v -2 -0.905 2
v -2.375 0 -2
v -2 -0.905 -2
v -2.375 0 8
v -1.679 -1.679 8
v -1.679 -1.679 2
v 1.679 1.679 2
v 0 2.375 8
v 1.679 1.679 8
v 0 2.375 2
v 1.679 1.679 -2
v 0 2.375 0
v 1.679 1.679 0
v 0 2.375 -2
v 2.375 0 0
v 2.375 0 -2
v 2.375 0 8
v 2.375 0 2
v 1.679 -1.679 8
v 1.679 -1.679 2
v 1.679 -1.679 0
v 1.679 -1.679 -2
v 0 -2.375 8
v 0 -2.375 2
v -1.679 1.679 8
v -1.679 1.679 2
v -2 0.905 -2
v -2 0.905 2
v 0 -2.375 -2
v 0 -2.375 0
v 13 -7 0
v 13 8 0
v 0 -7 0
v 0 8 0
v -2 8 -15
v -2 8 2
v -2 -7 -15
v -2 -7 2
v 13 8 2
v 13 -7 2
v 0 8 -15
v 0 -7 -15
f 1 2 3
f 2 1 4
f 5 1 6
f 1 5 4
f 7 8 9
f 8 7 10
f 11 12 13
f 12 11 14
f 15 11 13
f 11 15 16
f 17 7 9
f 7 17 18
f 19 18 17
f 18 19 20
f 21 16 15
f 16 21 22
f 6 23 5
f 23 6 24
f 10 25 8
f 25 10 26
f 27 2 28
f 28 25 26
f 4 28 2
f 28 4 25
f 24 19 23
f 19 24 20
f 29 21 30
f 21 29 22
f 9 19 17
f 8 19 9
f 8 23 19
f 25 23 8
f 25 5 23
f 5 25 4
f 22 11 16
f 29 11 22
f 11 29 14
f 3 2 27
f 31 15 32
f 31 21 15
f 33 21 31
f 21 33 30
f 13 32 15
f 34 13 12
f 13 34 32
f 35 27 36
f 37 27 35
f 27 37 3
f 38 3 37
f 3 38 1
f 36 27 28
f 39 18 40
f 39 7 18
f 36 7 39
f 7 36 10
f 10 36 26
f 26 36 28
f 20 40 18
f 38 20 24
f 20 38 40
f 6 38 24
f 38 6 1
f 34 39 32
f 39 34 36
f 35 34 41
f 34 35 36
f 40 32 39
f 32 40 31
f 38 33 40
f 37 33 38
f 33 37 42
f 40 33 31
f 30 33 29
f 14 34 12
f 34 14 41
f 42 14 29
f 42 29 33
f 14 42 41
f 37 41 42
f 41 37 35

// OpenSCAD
translate([0,0,-2])
cylinder(h=10,d=4.75);
translate([-2,-7,0])
linear_extrude(height = 2)
square(15);
translate([-2,-7,0])
rotate([0,90,0])
linear_extrude(height = 2)
square(15);
